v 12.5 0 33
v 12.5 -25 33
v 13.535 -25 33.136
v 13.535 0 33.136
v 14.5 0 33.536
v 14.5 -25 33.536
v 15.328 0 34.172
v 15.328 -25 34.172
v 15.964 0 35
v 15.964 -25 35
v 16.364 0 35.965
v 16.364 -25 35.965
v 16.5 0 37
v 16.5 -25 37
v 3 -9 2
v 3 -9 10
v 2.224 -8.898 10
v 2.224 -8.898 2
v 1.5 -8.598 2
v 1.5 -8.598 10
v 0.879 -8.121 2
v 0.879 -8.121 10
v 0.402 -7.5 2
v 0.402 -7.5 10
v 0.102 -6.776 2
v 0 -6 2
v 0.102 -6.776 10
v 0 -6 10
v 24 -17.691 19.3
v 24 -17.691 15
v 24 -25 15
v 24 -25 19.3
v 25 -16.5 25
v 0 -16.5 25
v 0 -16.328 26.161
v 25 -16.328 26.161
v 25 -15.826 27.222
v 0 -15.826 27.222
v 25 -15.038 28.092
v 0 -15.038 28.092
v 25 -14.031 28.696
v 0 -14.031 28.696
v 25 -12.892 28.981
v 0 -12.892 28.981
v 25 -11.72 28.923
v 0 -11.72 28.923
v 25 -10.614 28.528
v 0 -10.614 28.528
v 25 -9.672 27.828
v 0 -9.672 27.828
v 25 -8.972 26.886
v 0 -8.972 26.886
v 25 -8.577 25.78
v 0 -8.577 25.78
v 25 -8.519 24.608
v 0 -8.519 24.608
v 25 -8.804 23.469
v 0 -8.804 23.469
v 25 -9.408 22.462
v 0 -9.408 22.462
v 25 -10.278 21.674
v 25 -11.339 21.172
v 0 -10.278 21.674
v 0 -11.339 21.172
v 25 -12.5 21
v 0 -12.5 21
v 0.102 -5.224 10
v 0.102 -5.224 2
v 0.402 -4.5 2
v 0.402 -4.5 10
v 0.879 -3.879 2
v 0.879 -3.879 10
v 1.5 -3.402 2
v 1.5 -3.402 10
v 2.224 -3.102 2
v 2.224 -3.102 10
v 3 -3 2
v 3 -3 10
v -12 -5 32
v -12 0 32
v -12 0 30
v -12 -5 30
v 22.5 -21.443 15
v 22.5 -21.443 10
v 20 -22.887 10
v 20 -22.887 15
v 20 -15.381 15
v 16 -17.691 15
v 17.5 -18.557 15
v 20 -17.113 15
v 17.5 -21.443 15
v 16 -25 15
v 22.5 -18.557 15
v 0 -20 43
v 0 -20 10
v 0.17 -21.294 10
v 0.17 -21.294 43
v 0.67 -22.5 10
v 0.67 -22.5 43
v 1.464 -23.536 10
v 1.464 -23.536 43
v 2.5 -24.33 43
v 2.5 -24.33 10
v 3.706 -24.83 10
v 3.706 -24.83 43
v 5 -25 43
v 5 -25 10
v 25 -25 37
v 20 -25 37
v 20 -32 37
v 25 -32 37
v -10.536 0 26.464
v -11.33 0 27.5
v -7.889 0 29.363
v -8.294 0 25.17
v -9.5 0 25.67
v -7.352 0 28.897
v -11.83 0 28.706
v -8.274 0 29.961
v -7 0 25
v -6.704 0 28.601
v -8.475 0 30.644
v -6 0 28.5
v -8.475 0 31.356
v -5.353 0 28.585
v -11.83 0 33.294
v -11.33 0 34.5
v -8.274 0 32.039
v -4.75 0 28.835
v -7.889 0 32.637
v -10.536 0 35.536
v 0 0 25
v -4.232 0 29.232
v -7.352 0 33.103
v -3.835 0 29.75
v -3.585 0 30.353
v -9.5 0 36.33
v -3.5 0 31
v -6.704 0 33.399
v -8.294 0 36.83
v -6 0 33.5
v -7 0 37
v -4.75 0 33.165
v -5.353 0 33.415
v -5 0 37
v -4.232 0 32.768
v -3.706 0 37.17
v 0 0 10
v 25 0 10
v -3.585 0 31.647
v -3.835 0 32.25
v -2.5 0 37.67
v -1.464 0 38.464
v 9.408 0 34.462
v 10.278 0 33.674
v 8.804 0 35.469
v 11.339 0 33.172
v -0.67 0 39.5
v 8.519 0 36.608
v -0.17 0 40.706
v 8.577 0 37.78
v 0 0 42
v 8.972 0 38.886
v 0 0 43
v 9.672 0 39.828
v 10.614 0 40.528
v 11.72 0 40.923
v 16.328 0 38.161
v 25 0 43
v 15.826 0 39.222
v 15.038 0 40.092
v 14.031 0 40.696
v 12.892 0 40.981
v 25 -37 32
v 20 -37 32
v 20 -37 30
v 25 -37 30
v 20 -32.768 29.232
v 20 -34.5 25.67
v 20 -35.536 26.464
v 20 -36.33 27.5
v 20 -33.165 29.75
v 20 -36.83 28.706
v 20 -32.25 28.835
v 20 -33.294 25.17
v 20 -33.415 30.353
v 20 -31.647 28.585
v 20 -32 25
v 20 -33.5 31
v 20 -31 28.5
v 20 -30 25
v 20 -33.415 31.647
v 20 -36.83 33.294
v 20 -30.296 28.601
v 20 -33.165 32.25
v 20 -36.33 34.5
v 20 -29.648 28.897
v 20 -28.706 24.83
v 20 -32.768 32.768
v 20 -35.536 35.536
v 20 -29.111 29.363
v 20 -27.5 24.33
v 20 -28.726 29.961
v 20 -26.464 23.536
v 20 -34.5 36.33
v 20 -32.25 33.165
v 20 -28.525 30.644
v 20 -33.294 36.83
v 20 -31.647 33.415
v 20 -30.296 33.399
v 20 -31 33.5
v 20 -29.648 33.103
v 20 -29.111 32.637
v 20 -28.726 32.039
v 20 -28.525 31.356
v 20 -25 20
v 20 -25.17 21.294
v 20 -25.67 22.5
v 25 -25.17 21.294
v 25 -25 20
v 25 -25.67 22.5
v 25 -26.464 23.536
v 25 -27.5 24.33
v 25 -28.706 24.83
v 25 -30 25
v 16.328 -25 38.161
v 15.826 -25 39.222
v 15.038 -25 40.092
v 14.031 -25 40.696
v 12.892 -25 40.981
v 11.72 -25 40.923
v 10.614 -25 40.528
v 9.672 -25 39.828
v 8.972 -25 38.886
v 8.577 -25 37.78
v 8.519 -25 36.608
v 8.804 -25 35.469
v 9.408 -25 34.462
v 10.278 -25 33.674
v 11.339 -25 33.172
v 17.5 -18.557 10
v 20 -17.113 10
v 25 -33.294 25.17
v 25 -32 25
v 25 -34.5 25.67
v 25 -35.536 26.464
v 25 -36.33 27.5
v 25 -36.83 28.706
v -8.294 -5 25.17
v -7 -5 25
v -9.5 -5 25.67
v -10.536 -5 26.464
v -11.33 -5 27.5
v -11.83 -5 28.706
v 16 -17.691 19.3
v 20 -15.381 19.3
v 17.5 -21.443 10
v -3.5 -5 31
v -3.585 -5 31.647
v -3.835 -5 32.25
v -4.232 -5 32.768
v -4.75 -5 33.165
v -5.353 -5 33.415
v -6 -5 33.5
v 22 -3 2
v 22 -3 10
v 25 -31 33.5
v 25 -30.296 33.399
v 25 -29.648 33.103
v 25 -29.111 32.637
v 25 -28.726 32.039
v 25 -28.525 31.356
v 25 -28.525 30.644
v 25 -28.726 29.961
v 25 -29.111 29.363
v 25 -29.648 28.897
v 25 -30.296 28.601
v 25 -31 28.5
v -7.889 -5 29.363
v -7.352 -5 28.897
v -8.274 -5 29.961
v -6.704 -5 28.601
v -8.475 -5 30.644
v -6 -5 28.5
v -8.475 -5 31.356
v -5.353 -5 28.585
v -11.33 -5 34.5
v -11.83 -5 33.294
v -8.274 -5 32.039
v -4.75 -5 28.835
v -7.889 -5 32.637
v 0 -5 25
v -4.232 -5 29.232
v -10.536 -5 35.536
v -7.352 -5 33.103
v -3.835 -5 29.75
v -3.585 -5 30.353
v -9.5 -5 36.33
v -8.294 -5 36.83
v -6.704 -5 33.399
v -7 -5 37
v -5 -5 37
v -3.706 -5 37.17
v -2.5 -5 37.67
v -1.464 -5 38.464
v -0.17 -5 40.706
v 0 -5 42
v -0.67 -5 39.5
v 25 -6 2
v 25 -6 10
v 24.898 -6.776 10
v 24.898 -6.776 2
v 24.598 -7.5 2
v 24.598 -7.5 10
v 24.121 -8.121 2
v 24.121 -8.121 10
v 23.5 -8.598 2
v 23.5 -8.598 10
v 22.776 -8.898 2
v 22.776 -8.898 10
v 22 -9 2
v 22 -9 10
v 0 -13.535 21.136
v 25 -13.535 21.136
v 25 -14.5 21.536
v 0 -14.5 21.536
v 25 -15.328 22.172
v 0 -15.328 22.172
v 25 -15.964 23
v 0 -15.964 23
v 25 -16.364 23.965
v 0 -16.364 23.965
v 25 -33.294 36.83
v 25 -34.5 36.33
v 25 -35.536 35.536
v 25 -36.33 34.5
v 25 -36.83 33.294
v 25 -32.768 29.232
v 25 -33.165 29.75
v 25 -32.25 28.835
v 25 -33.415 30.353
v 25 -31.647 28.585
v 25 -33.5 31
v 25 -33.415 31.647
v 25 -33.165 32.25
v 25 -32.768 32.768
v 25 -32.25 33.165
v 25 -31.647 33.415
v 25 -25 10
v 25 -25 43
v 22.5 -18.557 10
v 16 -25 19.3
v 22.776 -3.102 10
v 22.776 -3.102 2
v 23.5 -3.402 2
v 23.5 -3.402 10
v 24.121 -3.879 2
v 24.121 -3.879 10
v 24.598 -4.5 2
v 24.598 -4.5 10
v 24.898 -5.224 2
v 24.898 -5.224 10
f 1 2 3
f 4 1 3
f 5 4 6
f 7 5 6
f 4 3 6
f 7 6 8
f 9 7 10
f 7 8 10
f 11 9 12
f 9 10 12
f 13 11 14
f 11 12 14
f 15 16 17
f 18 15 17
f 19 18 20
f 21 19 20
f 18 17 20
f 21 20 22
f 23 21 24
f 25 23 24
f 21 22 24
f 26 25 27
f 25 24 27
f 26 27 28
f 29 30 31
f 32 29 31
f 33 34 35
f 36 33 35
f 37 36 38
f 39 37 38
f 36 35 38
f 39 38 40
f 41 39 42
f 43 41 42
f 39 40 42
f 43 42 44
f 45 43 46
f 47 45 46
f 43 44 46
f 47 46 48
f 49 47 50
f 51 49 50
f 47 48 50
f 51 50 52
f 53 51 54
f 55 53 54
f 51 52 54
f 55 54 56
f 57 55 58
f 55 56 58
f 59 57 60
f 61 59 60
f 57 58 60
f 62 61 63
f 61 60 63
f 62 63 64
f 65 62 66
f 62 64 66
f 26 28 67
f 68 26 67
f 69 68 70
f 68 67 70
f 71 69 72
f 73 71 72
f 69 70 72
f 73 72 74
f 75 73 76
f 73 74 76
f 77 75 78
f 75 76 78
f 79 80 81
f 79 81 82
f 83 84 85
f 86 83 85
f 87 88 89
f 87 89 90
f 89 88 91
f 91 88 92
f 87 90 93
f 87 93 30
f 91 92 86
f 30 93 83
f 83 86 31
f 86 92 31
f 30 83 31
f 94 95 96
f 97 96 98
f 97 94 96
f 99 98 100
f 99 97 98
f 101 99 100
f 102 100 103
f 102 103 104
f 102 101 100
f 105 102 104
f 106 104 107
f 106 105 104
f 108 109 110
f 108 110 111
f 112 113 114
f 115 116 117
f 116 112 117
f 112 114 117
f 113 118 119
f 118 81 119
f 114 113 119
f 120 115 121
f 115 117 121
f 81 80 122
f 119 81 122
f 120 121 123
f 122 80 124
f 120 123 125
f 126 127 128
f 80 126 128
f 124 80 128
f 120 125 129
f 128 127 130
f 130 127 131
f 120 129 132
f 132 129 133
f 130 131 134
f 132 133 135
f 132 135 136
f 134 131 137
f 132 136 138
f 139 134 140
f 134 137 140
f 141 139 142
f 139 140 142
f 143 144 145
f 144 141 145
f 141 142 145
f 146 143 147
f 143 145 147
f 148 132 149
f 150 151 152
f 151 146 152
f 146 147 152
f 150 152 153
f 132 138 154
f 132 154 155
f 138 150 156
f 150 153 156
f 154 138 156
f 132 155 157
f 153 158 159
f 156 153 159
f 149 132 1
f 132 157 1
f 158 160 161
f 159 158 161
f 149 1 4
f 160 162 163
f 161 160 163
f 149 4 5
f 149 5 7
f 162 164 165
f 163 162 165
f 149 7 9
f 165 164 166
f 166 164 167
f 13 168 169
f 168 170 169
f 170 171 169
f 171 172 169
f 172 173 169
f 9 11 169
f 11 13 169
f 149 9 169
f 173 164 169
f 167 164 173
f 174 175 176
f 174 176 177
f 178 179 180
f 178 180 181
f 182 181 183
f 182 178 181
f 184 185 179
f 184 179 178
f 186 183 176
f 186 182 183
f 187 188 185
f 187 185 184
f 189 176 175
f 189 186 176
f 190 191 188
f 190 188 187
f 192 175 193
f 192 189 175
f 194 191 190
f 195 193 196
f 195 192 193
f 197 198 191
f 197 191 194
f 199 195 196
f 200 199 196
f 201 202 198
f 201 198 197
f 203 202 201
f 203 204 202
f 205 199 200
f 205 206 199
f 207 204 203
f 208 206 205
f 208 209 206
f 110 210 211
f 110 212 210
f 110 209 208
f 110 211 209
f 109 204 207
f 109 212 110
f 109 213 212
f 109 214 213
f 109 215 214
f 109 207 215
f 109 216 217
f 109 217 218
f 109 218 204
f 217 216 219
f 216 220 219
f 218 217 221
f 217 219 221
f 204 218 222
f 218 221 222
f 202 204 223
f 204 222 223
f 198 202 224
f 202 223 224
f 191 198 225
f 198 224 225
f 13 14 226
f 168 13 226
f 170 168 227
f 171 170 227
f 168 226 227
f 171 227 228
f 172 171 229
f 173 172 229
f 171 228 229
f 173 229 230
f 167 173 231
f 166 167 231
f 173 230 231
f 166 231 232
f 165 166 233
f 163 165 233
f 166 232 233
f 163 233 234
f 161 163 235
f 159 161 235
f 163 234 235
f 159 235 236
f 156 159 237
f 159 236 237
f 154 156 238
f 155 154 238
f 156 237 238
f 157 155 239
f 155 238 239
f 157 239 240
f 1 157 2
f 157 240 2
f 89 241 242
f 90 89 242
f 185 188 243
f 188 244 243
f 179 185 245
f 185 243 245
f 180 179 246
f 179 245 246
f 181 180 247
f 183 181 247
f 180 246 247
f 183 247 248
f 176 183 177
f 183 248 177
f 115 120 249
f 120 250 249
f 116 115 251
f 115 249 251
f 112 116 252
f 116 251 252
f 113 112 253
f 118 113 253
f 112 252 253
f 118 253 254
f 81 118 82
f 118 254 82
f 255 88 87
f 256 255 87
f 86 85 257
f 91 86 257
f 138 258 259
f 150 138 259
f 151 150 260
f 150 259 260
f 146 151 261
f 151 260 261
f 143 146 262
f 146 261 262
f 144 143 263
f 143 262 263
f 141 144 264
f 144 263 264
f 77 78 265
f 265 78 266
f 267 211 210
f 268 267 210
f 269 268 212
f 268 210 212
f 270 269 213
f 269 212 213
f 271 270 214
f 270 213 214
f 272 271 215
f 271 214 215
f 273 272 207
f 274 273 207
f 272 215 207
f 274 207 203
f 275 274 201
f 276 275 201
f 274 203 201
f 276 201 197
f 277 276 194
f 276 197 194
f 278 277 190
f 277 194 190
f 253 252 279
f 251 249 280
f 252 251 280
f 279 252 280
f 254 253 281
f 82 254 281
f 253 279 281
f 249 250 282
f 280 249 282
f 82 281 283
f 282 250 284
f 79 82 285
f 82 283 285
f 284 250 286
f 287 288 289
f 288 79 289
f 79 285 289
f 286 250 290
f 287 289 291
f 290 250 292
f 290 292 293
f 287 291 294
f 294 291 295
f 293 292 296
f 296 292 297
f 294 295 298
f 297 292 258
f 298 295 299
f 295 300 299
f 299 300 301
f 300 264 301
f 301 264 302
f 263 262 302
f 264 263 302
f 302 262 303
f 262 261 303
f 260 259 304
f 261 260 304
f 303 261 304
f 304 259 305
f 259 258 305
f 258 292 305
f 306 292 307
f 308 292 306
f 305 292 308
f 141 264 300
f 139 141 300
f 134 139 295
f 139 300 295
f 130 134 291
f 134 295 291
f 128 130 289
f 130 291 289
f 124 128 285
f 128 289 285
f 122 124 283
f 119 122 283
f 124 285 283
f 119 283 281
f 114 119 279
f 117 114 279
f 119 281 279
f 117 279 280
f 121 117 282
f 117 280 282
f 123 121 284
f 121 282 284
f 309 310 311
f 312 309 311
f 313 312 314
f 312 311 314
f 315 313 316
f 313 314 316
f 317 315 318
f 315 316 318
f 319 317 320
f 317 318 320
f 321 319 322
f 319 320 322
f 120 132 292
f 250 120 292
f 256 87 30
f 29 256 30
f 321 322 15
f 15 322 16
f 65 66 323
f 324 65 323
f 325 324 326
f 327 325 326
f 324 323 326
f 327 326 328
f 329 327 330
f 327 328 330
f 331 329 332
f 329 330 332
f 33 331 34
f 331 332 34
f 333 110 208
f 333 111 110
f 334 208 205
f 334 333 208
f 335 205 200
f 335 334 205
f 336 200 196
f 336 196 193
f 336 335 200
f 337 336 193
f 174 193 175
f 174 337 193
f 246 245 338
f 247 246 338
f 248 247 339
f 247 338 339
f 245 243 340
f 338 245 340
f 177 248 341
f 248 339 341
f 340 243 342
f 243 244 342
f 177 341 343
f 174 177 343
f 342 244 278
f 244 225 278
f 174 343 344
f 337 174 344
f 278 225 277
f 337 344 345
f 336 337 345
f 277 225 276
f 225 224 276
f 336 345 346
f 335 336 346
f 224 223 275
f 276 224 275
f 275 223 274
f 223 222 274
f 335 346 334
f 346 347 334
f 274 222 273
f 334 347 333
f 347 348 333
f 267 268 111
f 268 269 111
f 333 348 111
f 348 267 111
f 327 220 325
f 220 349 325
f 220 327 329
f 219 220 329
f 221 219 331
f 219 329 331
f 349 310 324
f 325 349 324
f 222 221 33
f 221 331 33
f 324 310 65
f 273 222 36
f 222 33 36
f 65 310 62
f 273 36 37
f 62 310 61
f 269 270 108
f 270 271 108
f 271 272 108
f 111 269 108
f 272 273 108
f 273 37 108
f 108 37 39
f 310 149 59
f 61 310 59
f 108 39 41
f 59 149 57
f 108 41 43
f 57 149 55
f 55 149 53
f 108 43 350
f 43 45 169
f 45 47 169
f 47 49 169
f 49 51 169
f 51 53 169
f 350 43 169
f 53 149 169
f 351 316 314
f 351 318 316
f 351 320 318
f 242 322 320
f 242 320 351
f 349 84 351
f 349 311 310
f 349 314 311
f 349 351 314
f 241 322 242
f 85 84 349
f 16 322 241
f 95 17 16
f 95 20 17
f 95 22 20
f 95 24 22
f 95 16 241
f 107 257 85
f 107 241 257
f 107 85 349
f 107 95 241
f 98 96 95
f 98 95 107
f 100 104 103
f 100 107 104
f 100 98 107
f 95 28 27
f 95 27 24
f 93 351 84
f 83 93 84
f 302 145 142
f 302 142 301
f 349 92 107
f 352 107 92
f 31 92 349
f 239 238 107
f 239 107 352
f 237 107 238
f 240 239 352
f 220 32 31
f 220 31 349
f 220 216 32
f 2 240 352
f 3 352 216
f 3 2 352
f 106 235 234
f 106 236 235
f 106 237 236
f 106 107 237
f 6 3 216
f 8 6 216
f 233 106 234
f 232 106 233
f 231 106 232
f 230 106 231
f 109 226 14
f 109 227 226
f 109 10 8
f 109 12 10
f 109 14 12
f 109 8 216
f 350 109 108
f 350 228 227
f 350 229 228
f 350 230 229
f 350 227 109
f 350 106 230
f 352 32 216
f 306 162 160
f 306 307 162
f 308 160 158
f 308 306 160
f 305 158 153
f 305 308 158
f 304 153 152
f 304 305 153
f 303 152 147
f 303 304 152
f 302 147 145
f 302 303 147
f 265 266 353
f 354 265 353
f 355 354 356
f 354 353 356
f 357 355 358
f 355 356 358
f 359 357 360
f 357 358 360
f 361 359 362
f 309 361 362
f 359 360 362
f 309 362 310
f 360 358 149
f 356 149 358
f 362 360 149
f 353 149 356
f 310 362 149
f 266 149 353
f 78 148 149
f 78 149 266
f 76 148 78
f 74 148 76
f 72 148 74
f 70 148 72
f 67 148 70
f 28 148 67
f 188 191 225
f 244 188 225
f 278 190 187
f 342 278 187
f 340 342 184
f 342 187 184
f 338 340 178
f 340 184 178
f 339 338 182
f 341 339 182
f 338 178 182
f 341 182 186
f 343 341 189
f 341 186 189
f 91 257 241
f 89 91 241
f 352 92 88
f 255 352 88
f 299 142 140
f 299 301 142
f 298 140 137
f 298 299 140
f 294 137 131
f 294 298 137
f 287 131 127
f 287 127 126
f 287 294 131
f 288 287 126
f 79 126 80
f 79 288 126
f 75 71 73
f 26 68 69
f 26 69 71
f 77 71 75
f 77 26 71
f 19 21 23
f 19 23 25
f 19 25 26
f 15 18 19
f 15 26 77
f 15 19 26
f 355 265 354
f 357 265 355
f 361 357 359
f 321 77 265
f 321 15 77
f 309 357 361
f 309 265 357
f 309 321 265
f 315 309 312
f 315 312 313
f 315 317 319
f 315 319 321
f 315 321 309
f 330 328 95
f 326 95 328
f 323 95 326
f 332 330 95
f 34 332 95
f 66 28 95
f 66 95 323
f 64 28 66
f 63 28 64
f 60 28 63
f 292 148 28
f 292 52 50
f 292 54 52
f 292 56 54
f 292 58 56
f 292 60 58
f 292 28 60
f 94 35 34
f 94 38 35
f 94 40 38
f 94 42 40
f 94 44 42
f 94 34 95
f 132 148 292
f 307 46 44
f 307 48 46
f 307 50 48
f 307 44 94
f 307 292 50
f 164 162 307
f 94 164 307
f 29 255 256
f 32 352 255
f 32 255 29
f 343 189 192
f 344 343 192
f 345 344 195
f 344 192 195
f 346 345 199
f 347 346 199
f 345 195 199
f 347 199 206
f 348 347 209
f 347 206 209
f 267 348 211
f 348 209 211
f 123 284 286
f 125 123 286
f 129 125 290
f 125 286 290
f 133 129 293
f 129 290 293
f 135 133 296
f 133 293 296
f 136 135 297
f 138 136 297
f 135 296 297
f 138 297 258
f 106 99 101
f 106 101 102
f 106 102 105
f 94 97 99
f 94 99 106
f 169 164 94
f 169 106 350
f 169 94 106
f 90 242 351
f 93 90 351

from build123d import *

# Parameters (mm, degrees)
F0_W      = 25
F0_H      = 45
F1_DEPTH  = 25
F3_DEPTH  = 25
F5_DEPTH  = 25
F6_W      = 5
F6_H      = 12
F7_DEPTH  = 12
F9_DEPTH  = 25
F10_R     = 5
F11_W     = 5
F11_H     = 12
F12_DEPTH = 12
F14_DEPTH = 25
F15_R     = 5
F16_W     = 19
F16_H     = 6
F17_DEPTH = 19
F19_DEPTH = 12
F20_R     = 5
F21_R     = 5
F22_DEPTH = 2
F24_DEPTH = 25
F27_DEPTH = 4.3
F28_DEPTH = 5
F30_DEPTH = 8


with BuildPart() as f1:
    # F0 (on Front) → F1 (new body)
    with BuildSketch(Plane.XZ):
        with Locations((12.5, 22.5)):
            Rectangle(F0_W, F0_H)
    extrude(amount=F1_DEPTH)

    # F2 (on face) → F3 (cut)
    with BuildSketch(Plane.XZ.offset(25)):
        with BuildLine():
            ThreePointArc((16.5, 37), (9.6715728753, 39.8284271247), (12.5, 33))
            ThreePointArc((12.5, 33), (15.3284271247, 34.1715728753), (16.5, 37))
        make_face()
    extrude(amount=-F3_DEPTH, mode=Mode.SUBTRACT)

    # F4 (on face) → F5 (cut)
    with BuildSketch(Plane(origin=(0, 0, 0), x_dir=(0, -1, 0), z_dir=(-1, 0, 0))):
        with BuildLine():
            ThreePointArc((16.5, 25), (9.6715728753, 27.8284271247), (12.5, 21))
            ThreePointArc((12.5, 21), (15.3284271247, 22.1715728753), (16.5, 25))
        make_face()
    extrude(amount=-F5_DEPTH, mode=Mode.SUBTRACT)

    # F6 (on face) → F7 (join)
    with BuildSketch(Plane(origin=(0, 0, 0), x_dir=(0, -1, 0), z_dir=(-1, 0, 0))):
        with Locations((2.5, 31)):
            Rectangle(F6_W, F6_H)
    extrude(amount=F7_DEPTH)

    # F8 (on face) → F9 (cut)
    with BuildSketch(Plane.XZ.offset(5)):
        with BuildLine():
            ThreePointArc((-6, 33.5), (-8.5, 31), (-6, 28.5))
            Line((-6, 28.5), (-6, 33.5))
        make_face()
        with BuildLine():
            Line((-6, 33.5), (-6, 28.5))
            ThreePointArc((-6, 28.5), (-4.232233047, 29.232233047), (-3.5, 31))
            ThreePointArc((-3.5, 31), (-4.232233047, 32.767766953), (-6, 33.5))
        make_face()
    extrude(amount=-F9_DEPTH, mode=Mode.SUBTRACT)

    # F10
    f10_edges = [f1.edges().sort_by_distance(p)[0] for p in [
        (-12, -2.5, 37),
        (-12, -2.5, 25),
        (0, -2.5, 37),
    ]]
    fillet(f10_edges, radius=F10_R)

    # F11 (on face) → F12 (join)
    with BuildSketch(Plane.XZ.offset(25)):
        with Locations((22.5, 31)):
            Rectangle(F11_W, F11_H)
    extrude(amount=F12_DEPTH)

    # F13 (on face) → F14 (cut)
    with BuildSketch(Plane(origin=(20, 0, 0), x_dir=(0, -1, 0), z_dir=(-1, 0, 0))):
        with BuildLine():
            ThreePointArc((31, 33.5), (28.5, 31), (31, 28.5))
            Line((31, 28.5), (31, 33.5))
        make_face()
        with BuildLine():
            Line((31, 33.5), (31, 28.5))
            ThreePointArc((31, 28.5), (32.767766953, 29.232233047), (33.5, 31))
            ThreePointArc((33.5, 31), (32.767766953, 32.767766953), (31, 33.5))
        make_face()
    extrude(amount=-F14_DEPTH, mode=Mode.SUBTRACT)

    # F15
    f15_edges = [f1.edges().sort_by_distance(p)[0] for p in [
        (22.5, -37, 37),
        (22.5, -37, 25),
        (22.5, -25, 25),
    ]]
    fillet(f15_edges, radius=F15_R)

    # F16 (on face) → F17 (cut)
    with BuildSketch(Plane(origin=(0, 0, 0), x_dir=(0, -1, 0), z_dir=(-1, 0, 0))):
        with Locations((15.5, 7)):
            Rectangle(F16_W, F16_H)
    extrude(amount=-F17_DEPTH, mode=Mode.SUBTRACT)

    # F18 (on face) → F19 (cut)
    with BuildSketch(Plane(origin=(0, 0, 0), x_dir=(1, 0, 0), z_dir=(0, 0, -1))):
        Polygon((17.5, 21.443375673), (17.5, 18.556624327), (20, 17.1132486541), (22.5, 18.556624327), (22.5, 20), (20, 20), (20, 22.8867513459), align=None)
        Polygon((22.5, 21.443375673), (20, 22.8867513459), (20, 20), (22.5, 20), align=None)
    extrude(amount=-F19_DEPTH, mode=Mode.SUBTRACT)

    # F20
    f20_edges = [f1.edges().sort_by_distance(p)[0] for p in [
        (19, -6, 7),
    ]]
    fillet(f20_edges, radius=F20_R)

    # F21
    f21_edges = [f1.edges().sort_by_distance(p)[0] for p in [
        (0, -25, 2),
        (0, -25, 27.5),
    ]]
    fillet(f21_edges, radius=F21_R)

    # F22 (cut): a face of the model
    f22_faces = [f1.faces().sort_by_distance(p)[0] for p in [
        (12.59855993, -12.40144007, 45),
    ]]
    extrude(f22_faces, amount=-F22_DEPTH, mode=Mode.SUBTRACT)

    # F23 (on face) → F24 (cut)
    with BuildSketch(Plane.XZ.offset(25)):
        Polygon((25, 10), (19, 10), (19, 4), (5, 4), (5, 0), (25, 0), align=None)
        Polygon((19, 4), (19, 10), (5, 10), (0, 10), (0, 0), (5, 0), (5, 4), align=None)
    extrude(amount=-F24_DEPTH, mode=Mode.SUBTRACT)

    # F26 (on offset) → F27 (cut)
    with BuildSketch(Plane(origin=(0, 0, 15), x_dir=(1, 0, 0), z_dir=(0, 0, -1))):
        Polygon((24, 17.6905989232), (24, 22.3094010768), (20, 24.6188021535), (16, 22.3094010768), (16, 17.6905989232), (20, 15.3811978465), align=None)
        Polygon((20, 24.6188021535), (24, 22.3094010768), (24, 30.3094010768), (16, 30.3094010768), (16, 22.3094010768), align=None)
    extrude(amount=-F27_DEPTH, mode=Mode.SUBTRACT)

    # F28 (cut): a face of the model
    f28_faces = [f1.faces().sort_by_distance(p)[0] for p in [
        (20, -20, 12),
    ]]
    extrude(f28_faces, amount=-F28_DEPTH, mode=Mode.SUBTRACT)

    # F29 (on face) → F30 (join)
    with BuildSketch(Plane(origin=(0, 0, 10), x_dir=(1, 0, 0), z_dir=(0, 0, -1))):
        with BuildLine():
            ThreePointArc((0, 6), (0.8786796564, 3.8786796564), (3, 3))
            Line((3, 3), (22, 3))
            ThreePointArc((22, 3), (24.1213203436, 3.8786796564), (25, 6))
            ThreePointArc((25, 6), (24.1213203436, 8.1213203436), (22, 9))
            Line((22, 9), (3, 9))
            ThreePointArc((3, 9), (0.8786796564, 8.1213203436), (0, 6))
        make_face()
    extrude(amount=F30_DEPTH)


solid = f1.part
